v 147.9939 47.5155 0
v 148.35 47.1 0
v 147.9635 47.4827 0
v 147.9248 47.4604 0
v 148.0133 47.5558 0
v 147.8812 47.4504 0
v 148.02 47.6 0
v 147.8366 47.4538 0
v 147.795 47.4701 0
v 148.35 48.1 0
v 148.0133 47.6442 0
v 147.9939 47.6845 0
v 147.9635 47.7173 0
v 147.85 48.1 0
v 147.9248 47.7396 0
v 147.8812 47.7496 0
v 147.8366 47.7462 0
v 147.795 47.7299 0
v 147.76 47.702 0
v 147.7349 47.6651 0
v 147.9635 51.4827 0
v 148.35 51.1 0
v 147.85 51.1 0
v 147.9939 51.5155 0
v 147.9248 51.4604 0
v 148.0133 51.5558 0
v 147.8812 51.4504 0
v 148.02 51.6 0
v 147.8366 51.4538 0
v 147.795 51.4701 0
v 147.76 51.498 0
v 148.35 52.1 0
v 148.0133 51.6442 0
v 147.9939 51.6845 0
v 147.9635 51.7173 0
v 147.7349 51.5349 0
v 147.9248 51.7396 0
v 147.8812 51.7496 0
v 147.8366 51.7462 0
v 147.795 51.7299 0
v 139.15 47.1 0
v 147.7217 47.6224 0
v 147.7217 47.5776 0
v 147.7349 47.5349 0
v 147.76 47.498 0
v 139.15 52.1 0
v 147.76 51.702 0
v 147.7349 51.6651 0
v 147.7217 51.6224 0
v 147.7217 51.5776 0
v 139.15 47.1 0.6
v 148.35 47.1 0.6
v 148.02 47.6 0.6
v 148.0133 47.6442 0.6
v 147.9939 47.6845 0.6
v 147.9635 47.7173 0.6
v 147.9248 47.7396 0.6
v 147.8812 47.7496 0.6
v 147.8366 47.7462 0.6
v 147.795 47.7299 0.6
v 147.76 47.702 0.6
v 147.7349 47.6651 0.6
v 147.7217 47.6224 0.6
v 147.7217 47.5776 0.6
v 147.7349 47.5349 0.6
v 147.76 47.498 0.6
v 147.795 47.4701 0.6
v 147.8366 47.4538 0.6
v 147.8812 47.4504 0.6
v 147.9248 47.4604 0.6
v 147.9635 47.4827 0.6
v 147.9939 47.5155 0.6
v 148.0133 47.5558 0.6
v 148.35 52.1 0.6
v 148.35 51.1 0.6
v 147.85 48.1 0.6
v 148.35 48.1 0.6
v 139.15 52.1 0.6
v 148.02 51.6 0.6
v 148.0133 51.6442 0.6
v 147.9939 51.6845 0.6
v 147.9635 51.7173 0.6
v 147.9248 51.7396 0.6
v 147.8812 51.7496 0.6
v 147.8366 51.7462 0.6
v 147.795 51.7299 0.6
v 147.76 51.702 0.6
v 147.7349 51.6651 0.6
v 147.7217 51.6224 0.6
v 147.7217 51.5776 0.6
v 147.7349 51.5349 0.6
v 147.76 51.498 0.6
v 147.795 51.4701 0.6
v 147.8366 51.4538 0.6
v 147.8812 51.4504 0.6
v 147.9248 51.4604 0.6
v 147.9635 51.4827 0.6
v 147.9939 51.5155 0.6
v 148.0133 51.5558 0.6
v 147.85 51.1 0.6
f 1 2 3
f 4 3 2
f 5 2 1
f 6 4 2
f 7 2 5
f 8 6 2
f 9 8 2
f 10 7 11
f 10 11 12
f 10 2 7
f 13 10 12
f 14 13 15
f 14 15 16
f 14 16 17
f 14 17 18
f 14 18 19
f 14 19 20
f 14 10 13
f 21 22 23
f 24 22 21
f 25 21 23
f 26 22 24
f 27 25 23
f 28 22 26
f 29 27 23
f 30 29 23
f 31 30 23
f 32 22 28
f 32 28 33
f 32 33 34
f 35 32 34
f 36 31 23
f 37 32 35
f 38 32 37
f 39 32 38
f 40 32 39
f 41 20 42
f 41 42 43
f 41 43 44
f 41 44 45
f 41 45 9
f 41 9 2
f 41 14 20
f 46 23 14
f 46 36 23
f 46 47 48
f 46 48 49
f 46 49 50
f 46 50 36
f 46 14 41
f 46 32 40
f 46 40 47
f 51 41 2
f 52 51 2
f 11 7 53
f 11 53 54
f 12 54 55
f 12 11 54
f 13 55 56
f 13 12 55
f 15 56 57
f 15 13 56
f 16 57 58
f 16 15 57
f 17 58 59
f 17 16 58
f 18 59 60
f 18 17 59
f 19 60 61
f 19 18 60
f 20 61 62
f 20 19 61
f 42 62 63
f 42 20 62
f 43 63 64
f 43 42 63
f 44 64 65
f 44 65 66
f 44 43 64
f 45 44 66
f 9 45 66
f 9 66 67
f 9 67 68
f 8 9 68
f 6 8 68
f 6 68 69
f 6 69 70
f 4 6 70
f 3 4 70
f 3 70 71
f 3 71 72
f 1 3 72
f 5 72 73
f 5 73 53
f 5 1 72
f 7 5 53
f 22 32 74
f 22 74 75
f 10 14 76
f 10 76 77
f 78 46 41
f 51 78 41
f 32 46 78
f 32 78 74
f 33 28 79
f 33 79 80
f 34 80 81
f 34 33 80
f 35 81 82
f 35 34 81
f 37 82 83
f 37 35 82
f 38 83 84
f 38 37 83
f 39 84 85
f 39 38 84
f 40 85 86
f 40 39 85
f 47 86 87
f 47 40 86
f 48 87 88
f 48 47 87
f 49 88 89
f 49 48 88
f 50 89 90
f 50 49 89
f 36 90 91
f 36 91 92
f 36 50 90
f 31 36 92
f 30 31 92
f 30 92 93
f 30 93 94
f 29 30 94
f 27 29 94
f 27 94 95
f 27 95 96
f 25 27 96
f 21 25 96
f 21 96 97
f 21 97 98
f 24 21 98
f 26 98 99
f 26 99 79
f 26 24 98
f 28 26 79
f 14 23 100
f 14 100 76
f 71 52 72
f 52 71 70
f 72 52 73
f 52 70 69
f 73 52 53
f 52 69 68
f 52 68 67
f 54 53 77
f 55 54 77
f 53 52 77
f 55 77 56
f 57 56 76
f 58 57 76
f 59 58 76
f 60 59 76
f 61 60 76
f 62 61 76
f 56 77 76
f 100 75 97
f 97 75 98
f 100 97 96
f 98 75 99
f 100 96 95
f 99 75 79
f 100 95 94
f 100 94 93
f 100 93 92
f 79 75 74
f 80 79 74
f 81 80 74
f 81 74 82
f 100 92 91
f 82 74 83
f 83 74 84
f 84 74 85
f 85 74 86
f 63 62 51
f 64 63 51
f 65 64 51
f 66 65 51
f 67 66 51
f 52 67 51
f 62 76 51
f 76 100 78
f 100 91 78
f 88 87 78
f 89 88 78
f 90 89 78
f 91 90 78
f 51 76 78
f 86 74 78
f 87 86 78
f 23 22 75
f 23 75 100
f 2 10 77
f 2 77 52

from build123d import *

# Parameters (mm, degrees)
SKETCH1_R           = 0.15
BOSS_EXTRUDE1_DEPTH = 0.6


with BuildPart() as part:
    # Sketch1 → Boss-Extrude1 (new body)
    with BuildSketch(Plane.XY):
        Polygon((148.35, 52.1), (148.35, 51.1), (147.85, 51.1), (147.85, 48.1), (148.35, 48.1), (148.35, 47.1), (146.55, 47.1), (146.05, 47.1), (140.55, 47.1), (140.05, 47.1), (139.15, 47.1), (139.15, 48.3), (139.15, 49.3), (139.15, 52.1), align=None)
        with Locations((147.87, 47.6)):
            Circle(SKETCH1_R, mode=Mode.SUBTRACT)
        with Locations((147.87, 51.6)):
            Circle(SKETCH1_R, mode=Mode.SUBTRACT)
    extrude(amount=BOSS_EXTRUDE1_DEPTH)


solid = part.part
